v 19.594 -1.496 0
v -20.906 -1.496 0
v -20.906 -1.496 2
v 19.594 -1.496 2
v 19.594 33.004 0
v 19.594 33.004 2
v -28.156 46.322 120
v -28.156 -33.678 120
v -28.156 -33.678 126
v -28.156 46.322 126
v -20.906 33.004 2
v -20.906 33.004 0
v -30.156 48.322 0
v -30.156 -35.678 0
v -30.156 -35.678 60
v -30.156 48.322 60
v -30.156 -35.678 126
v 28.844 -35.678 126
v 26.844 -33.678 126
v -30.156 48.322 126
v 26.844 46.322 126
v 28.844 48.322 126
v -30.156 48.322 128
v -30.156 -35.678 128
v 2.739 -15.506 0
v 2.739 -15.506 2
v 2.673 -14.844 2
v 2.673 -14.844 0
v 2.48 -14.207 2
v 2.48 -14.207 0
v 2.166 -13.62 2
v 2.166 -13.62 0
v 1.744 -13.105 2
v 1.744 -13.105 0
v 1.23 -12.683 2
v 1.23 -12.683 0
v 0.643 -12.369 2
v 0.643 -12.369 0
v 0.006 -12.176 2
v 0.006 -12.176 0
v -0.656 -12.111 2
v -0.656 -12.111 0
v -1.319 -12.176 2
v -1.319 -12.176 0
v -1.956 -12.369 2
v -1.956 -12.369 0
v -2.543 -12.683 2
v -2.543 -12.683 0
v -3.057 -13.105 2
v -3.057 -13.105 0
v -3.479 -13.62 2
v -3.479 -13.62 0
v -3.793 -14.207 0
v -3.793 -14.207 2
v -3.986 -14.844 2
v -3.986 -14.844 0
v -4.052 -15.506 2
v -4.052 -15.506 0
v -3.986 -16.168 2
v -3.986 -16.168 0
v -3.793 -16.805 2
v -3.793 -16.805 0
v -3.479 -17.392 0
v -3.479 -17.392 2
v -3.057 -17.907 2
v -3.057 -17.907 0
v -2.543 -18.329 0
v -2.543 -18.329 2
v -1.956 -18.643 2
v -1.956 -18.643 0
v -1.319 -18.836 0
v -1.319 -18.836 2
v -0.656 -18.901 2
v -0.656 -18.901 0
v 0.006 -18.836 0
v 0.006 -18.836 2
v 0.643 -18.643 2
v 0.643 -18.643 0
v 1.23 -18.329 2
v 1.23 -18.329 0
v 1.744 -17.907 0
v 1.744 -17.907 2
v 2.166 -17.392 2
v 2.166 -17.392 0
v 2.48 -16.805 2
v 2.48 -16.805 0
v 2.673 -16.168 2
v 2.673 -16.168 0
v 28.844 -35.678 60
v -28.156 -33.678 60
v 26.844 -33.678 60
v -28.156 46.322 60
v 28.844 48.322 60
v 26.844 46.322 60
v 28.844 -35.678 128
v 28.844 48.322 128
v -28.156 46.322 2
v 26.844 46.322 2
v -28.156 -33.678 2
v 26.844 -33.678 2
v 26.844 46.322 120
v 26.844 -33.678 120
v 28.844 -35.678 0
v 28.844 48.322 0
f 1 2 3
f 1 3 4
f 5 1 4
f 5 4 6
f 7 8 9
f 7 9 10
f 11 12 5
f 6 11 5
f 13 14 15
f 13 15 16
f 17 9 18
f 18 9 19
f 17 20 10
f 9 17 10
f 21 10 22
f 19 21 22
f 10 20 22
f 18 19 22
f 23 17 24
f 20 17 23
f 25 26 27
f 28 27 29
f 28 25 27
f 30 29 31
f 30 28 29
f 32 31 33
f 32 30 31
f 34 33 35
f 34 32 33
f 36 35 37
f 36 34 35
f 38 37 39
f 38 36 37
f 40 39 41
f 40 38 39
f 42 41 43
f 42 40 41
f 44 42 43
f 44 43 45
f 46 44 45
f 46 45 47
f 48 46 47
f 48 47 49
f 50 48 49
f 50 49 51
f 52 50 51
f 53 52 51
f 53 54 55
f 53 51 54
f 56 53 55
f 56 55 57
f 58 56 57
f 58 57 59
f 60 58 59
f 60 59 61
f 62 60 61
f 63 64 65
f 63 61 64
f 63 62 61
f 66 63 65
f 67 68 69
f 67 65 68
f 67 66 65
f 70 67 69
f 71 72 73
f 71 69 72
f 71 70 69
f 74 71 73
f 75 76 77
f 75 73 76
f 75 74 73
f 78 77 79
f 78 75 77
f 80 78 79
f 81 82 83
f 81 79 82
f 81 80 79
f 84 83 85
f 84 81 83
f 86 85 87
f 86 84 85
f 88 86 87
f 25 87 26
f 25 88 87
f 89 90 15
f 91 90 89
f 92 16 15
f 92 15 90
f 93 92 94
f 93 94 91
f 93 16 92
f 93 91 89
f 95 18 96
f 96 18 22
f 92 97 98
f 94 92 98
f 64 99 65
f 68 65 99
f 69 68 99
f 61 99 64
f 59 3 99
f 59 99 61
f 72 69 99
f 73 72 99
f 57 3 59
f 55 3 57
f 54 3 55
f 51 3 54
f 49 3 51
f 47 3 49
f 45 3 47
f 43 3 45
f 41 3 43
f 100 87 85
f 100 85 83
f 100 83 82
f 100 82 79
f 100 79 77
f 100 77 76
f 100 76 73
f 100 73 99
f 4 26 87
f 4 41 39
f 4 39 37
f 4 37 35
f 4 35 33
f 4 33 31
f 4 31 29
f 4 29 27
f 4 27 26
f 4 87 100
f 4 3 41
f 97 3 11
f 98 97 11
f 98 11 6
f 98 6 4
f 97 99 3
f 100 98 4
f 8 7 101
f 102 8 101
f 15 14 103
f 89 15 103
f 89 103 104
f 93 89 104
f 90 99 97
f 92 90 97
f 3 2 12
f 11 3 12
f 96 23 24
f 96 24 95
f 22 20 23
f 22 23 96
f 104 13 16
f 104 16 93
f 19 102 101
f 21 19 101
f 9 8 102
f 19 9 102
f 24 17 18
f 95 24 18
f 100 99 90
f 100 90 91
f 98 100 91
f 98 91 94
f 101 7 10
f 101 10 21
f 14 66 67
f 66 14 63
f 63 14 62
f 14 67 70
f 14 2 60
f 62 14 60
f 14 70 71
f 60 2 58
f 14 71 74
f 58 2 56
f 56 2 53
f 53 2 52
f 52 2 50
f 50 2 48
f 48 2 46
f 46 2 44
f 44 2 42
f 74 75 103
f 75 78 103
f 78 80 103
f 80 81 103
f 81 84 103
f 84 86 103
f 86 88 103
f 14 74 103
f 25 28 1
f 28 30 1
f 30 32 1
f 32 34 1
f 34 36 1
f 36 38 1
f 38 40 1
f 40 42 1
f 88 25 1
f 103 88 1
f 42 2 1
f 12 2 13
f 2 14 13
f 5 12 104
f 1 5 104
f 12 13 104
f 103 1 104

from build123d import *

# Parameters (mm, degrees)
F0_W      = 55
F0_H      = 80
F1_DEPTH  = 2
F0_W_2    = 58.9999967363
F0_H_2    = 83.9999967363
F2_DEPTH  = 60
F3_START  = 120
F1_FACE_W = 55
F1_FACE_H = 80
F3_DEPTH  = 6
F4_START  = 126
F4_DEPTH  = 2
F5_R      = 3.395090495
F5_W      = 40.5
F5_H      = 34.5
F6_DEPTH  = 16.7


# Not quite as in the source:
# - a feature names something its author has since deleted; it is built from what else it names


with BuildPart() as f1:
    # F0 (on Top) → F1 (new body)
    with BuildSketch(Plane.XY):
        with Locations((-0.6564213149, 6.3218075262)):
            Rectangle(F0_W, F0_H)
    extrude(amount=F1_DEPTH)

    # F0 (on Top) → F2 (join)
    with BuildSketch(Plane.XY):
        with Locations((-0.6564213149, 6.3218075262)):
            Rectangle(F0_W_2, F0_H_2)
        with Locations((-0.6564213149, 6.3218075262)):
            Rectangle(F0_W, F0_H, mode=Mode.SUBTRACT)
    extrude(amount=F2_DEPTH)

    # F5 (on face) → F6 (cut)
    with BuildSketch(Plane.XY):
        with Locations((-0.6564213149, -15.506147407)):
            Circle(F5_R)
        with Locations((-0.6564213149, 15.7543346533)):
            Rectangle(F5_W, F5_H)
    extrude(amount=F6_DEPTH, mode=Mode.SUBTRACT)


with BuildPart() as f3:
    # F1_face (on face) + F0 (on Top) → F3 (new body)
    with BuildSketch(Plane(origin=(-0.6564213149, 6.3218075262, 2), x_dir=(1, 0, 0), z_dir=(0, 0, 1)).offset(F3_START)):
        Rectangle(F1_FACE_W, F1_FACE_H)
    with BuildSketch(Plane.XY.offset(F3_START)):
        with Locations((-0.6564213149, 6.3218075262)):
            Rectangle(F0_W, F0_H)
    extrude(amount=F3_DEPTH)

    # F0 (on Top) → F4 (join)
    with BuildSketch(Plane.XY.offset(F4_START)):
        with Locations((-0.6564213149, 6.3218075262)):
            Rectangle(F0_W_2, F0_H_2)
        with Locations((-0.6564213149, 6.3218075262)):
            Rectangle(F0_W, F0_H, mode=Mode.SUBTRACT)
    extrude(amount=F4_DEPTH)


solid = Compound([f1.part, f3.part])
